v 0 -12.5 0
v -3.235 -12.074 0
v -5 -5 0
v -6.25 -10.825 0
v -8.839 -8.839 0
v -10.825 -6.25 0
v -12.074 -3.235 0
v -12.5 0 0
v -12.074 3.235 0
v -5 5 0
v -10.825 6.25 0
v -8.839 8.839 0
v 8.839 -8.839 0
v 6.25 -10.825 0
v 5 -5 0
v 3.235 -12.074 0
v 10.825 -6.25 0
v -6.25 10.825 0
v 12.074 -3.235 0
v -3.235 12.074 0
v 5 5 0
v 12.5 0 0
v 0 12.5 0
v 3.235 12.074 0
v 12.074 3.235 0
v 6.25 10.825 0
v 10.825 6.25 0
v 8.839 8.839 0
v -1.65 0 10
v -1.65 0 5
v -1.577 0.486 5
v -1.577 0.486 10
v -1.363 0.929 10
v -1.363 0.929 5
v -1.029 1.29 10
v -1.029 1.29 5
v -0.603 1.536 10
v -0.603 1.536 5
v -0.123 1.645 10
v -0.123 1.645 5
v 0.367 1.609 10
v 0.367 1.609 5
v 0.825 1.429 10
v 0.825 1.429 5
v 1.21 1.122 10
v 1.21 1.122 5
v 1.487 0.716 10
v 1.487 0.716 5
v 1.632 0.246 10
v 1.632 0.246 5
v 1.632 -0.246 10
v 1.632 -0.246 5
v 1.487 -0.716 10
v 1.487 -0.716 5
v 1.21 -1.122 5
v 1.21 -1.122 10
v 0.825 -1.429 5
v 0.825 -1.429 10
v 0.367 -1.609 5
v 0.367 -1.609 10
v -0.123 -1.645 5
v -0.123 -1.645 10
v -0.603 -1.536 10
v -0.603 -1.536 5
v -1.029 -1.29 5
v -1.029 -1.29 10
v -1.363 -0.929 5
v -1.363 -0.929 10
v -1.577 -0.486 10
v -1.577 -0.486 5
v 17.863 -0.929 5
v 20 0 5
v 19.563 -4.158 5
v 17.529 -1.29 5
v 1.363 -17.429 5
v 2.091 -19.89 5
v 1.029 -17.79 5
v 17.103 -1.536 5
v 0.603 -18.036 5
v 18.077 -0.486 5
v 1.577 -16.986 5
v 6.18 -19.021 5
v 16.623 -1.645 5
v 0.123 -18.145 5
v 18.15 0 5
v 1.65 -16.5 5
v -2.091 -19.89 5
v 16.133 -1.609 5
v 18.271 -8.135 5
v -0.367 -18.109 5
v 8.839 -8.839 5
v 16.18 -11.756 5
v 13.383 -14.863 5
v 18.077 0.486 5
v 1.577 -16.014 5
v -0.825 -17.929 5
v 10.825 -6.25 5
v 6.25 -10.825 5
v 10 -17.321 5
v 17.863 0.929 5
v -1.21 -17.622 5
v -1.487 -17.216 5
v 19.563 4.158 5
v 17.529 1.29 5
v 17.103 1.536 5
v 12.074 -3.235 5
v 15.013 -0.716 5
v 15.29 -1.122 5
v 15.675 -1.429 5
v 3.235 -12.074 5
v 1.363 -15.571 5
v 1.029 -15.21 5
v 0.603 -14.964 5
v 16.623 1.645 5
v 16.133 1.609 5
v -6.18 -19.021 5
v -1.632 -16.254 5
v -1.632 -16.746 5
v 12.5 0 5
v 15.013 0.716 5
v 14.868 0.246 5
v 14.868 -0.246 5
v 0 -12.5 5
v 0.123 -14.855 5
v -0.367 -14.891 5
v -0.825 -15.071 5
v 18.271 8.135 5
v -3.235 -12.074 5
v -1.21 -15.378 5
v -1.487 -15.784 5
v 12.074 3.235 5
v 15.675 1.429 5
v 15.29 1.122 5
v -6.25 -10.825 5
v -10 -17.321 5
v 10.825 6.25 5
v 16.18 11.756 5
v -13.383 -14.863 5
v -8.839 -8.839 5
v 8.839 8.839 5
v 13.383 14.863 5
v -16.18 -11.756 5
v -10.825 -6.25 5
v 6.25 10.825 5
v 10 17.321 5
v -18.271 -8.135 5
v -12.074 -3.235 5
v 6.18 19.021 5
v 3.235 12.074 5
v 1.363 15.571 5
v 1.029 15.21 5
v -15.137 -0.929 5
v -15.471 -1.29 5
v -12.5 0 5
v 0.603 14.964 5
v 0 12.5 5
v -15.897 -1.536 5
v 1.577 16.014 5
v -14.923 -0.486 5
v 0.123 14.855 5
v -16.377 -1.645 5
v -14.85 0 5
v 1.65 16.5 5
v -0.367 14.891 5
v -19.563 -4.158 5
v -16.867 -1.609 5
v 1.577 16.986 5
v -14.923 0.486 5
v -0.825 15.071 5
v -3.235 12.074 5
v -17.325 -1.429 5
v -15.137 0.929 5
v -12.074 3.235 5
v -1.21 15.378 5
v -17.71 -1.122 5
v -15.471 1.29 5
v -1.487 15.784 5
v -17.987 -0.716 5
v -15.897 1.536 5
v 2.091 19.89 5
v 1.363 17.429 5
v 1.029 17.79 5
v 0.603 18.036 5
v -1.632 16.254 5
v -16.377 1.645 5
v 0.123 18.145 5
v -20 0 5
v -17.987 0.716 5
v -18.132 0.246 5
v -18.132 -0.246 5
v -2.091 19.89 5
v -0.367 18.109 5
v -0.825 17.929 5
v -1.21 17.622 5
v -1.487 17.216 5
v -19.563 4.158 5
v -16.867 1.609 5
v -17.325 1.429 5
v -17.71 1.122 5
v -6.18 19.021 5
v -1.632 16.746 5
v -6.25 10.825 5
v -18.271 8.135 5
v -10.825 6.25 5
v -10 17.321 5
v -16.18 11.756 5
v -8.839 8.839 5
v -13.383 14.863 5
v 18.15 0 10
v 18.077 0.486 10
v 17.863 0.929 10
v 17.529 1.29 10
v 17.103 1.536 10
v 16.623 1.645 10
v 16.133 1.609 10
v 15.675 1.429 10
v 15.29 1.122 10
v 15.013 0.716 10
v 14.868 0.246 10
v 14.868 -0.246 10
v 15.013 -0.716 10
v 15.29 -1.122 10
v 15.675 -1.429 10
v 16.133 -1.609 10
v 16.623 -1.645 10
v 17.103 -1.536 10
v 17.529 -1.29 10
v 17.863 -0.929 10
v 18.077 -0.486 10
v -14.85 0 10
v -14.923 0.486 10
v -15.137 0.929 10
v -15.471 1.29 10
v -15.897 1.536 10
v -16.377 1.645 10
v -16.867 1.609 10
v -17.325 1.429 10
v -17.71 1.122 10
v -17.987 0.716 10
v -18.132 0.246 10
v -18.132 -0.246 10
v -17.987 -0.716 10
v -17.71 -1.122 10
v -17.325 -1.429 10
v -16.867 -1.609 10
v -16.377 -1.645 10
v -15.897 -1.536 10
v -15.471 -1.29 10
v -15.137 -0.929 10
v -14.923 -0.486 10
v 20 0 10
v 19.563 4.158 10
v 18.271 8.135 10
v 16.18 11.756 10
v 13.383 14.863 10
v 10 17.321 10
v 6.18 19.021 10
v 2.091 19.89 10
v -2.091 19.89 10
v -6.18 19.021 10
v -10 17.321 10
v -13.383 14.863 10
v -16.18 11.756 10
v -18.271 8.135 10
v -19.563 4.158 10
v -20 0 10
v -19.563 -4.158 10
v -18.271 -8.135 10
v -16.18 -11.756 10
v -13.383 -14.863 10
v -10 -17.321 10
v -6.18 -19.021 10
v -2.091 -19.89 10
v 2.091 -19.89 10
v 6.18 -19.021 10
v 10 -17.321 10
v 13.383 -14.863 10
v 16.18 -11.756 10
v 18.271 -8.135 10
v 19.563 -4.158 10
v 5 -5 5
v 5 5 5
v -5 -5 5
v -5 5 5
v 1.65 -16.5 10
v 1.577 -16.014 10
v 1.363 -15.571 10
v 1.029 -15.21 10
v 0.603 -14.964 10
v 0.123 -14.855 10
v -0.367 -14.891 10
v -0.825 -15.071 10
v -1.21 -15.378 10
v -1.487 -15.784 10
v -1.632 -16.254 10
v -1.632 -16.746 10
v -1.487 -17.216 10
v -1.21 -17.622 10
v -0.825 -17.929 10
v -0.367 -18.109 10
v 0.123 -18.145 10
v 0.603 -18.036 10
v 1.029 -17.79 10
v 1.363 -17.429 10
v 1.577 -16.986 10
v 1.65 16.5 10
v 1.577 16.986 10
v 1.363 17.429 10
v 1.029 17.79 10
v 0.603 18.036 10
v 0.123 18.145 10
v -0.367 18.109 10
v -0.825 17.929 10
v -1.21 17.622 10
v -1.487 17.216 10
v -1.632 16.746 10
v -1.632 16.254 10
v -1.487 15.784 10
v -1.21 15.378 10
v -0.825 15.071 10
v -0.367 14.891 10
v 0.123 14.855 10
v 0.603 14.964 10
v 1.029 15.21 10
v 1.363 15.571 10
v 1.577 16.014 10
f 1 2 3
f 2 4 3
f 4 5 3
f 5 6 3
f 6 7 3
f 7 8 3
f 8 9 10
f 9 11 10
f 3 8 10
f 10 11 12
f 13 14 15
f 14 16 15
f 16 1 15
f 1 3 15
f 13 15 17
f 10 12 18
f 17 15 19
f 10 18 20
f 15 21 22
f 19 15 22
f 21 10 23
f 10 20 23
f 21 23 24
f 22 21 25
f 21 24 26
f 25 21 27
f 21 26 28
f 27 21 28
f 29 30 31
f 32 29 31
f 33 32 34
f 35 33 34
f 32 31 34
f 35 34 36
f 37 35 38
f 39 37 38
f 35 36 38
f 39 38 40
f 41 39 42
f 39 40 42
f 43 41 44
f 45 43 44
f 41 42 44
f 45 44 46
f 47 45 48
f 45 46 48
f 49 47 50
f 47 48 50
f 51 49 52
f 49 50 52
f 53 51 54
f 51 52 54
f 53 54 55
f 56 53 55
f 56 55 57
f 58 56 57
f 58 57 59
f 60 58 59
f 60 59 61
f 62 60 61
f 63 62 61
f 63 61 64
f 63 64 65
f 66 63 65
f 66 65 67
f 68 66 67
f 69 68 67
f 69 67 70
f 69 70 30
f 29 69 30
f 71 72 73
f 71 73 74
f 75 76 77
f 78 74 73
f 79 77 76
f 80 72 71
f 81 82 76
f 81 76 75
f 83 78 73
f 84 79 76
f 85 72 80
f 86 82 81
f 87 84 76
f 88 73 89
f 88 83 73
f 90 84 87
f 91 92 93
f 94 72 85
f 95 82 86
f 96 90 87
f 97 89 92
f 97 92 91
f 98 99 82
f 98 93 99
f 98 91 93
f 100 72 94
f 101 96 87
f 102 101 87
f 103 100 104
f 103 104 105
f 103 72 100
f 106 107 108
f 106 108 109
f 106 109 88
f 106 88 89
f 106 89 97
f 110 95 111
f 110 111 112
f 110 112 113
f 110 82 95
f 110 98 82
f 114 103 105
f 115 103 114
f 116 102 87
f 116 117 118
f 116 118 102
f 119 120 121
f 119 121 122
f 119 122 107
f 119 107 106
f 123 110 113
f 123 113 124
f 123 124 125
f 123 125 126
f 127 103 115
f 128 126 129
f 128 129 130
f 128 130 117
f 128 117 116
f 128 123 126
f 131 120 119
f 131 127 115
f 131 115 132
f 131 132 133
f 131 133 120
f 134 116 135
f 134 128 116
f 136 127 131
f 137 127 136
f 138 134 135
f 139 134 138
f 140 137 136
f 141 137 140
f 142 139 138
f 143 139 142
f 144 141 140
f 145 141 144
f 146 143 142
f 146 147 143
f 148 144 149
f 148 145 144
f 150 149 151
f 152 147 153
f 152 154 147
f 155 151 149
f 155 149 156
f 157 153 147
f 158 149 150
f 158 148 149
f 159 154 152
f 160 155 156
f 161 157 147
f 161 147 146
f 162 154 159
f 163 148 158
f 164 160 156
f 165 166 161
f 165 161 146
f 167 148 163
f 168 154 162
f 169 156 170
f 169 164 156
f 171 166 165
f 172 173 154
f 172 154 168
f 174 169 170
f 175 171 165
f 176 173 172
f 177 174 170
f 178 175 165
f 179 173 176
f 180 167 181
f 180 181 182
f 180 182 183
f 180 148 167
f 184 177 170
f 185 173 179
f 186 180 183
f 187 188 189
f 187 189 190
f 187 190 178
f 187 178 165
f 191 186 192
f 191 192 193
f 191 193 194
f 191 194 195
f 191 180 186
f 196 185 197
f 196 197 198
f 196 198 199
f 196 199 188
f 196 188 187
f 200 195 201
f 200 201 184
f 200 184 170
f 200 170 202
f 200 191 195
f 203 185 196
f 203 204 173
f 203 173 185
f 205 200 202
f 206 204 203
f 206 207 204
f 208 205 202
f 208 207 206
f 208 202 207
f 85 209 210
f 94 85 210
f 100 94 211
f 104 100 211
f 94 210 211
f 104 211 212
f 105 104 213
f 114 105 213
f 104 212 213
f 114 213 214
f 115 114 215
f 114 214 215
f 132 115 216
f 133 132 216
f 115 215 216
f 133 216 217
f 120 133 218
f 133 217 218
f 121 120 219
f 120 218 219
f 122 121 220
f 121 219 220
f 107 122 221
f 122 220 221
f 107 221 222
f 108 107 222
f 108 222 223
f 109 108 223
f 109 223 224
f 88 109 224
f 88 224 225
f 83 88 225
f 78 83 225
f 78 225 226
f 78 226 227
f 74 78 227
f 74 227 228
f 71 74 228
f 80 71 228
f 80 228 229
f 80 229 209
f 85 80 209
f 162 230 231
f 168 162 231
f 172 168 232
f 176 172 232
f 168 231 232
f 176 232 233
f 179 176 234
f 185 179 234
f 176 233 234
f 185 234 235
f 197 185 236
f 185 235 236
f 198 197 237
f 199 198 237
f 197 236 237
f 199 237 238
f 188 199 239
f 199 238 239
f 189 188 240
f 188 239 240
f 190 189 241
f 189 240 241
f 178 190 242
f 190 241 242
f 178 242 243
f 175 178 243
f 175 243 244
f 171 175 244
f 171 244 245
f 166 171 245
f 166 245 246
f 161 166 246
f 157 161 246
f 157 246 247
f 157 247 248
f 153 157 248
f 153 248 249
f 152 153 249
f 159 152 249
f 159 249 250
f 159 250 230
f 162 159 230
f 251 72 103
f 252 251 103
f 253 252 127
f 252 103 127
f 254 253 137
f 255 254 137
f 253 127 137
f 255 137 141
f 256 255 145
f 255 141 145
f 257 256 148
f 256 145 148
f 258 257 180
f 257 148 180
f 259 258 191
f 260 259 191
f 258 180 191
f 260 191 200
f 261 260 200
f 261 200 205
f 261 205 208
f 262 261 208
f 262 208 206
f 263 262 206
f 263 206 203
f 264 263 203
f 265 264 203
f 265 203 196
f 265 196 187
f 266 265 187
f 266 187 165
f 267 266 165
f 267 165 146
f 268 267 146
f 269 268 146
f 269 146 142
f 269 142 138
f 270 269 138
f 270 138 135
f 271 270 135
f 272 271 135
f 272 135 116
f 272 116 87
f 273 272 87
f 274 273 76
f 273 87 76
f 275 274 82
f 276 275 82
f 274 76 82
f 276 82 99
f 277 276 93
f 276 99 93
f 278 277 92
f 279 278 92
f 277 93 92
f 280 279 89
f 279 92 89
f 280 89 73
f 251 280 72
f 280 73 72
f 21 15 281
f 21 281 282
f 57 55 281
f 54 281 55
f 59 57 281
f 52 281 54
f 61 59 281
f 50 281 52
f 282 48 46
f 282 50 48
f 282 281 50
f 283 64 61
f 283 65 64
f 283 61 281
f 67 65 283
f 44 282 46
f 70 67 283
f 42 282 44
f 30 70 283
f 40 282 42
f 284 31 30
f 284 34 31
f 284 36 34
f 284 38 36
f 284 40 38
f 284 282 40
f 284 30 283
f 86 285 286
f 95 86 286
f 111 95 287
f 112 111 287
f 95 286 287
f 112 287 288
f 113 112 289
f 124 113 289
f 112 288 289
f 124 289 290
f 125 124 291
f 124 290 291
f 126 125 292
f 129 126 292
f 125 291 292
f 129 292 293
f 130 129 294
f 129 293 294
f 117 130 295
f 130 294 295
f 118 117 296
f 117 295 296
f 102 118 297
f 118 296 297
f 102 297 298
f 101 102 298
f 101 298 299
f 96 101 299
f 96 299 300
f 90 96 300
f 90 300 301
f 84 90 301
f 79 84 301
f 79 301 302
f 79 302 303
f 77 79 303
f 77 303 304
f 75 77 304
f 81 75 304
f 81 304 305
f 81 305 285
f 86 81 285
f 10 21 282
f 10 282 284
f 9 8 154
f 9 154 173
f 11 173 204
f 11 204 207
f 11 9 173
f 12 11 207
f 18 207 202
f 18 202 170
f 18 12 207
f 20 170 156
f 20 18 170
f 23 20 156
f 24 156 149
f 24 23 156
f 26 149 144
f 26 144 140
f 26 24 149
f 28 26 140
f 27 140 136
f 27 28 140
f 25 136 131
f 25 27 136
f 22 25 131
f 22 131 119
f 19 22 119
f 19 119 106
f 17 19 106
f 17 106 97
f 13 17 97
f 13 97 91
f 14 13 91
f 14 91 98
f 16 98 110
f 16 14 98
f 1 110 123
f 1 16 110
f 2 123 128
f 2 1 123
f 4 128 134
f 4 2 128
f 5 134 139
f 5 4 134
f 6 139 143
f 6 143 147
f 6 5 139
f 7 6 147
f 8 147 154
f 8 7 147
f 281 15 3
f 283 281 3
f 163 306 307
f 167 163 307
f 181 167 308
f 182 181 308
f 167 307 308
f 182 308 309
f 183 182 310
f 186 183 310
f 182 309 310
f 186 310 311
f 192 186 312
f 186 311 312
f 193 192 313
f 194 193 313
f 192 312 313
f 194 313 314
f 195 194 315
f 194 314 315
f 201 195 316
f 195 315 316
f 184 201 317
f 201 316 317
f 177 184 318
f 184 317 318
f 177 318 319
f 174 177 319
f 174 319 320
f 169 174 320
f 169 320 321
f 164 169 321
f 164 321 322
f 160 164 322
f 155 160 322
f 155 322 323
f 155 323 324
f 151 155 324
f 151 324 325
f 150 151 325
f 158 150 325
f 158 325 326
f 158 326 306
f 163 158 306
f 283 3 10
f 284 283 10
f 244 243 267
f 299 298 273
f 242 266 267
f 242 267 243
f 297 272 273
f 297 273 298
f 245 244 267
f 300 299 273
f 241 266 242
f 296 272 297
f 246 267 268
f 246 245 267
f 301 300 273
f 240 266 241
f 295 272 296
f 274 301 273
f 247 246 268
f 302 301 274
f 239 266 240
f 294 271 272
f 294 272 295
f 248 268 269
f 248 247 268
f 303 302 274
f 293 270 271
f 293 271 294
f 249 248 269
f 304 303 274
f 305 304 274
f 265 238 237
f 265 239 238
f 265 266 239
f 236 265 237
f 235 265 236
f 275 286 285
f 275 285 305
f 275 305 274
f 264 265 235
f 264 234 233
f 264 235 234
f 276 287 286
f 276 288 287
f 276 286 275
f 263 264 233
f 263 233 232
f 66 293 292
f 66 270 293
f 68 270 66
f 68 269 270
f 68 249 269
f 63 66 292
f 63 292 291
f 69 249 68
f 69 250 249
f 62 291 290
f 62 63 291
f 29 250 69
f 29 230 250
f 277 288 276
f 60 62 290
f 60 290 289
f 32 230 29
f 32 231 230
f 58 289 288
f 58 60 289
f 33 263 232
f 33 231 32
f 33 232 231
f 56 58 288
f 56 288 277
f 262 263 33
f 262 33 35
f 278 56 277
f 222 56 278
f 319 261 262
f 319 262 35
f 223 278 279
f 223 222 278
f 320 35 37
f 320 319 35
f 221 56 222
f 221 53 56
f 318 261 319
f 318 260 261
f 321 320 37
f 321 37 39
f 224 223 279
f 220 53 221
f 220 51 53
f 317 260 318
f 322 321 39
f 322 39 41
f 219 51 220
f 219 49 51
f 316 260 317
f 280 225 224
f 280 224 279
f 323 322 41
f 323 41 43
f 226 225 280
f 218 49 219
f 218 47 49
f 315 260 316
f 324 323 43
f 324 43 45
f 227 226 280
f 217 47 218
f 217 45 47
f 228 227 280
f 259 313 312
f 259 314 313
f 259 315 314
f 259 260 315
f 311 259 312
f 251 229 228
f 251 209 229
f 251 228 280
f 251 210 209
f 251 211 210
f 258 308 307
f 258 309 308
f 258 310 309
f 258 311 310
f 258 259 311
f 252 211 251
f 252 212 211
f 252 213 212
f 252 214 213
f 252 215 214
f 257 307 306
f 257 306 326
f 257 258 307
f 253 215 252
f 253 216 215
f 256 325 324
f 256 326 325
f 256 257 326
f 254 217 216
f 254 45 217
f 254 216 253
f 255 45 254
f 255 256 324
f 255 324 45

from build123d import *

# Parameters (mm, degrees)
SKETCH1_R             = 20
BOSS_EXTRUDE1_DEPTH   = 10
SKETCH2_W             = 10
SKETCH2_H             = 10
CUT_EXTRUDE1_DEPTH    = 5
M4X0_7_TAPPED_HOLE1_D = 3.3
SKETCH6_R             = 20
SKETCH6_R_2           = 12.5
CUT_EXTRUDE2_DEPTH    = 5
M4X0_7_TAPPED_HOLE2_D = 3.3


with BuildPart() as part:
    # Sketch1 → Boss-Extrude1 (new body)
    with BuildSketch(Plane.XY):
        Circle(SKETCH1_R)
    extrude(amount=BOSS_EXTRUDE1_DEPTH)

    # Sketch2 → Cut-Extrude1 (cut)
    with BuildSketch(Plane(origin=(0, 0, 0), x_dir=(-1, 0, 0), z_dir=(0, 0, -1))):
        Rectangle(SKETCH2_W, SKETCH2_H)
    extrude(amount=-CUT_EXTRUDE1_DEPTH, mode=Mode.SUBTRACT)

    # M4x0.7 Tapped Hole1 (through all)
    with Locations(Plane.XY.offset(10)):
        with Locations((0, 0)):
            Hole(M4X0_7_TAPPED_HOLE1_D / 2)

    # Sketch6 → Cut-Extrude2 (cut)
    with BuildSketch(Plane(origin=(0, 0, 0), x_dir=(-1, 0, 0), z_dir=(0, 0, -1))):
        Circle(SKETCH6_R)
        Circle(SKETCH6_R_2, mode=Mode.SUBTRACT)
    extrude(amount=-CUT_EXTRUDE2_DEPTH, mode=Mode.SUBTRACT)

    # M4x0.7 Tapped Hole2 (through all)
    with Locations(Plane(origin=(0, 0, 5), x_dir=(-1, 0, 0), z_dir=(0, 0, -1))):
        with Locations((0, 16.5), (16.5, 0), (0, -16.5), (0, 0), (-16.5, 0)):
            Hole(M4X0_7_TAPPED_HOLE2_D / 2)


solid = part.part
